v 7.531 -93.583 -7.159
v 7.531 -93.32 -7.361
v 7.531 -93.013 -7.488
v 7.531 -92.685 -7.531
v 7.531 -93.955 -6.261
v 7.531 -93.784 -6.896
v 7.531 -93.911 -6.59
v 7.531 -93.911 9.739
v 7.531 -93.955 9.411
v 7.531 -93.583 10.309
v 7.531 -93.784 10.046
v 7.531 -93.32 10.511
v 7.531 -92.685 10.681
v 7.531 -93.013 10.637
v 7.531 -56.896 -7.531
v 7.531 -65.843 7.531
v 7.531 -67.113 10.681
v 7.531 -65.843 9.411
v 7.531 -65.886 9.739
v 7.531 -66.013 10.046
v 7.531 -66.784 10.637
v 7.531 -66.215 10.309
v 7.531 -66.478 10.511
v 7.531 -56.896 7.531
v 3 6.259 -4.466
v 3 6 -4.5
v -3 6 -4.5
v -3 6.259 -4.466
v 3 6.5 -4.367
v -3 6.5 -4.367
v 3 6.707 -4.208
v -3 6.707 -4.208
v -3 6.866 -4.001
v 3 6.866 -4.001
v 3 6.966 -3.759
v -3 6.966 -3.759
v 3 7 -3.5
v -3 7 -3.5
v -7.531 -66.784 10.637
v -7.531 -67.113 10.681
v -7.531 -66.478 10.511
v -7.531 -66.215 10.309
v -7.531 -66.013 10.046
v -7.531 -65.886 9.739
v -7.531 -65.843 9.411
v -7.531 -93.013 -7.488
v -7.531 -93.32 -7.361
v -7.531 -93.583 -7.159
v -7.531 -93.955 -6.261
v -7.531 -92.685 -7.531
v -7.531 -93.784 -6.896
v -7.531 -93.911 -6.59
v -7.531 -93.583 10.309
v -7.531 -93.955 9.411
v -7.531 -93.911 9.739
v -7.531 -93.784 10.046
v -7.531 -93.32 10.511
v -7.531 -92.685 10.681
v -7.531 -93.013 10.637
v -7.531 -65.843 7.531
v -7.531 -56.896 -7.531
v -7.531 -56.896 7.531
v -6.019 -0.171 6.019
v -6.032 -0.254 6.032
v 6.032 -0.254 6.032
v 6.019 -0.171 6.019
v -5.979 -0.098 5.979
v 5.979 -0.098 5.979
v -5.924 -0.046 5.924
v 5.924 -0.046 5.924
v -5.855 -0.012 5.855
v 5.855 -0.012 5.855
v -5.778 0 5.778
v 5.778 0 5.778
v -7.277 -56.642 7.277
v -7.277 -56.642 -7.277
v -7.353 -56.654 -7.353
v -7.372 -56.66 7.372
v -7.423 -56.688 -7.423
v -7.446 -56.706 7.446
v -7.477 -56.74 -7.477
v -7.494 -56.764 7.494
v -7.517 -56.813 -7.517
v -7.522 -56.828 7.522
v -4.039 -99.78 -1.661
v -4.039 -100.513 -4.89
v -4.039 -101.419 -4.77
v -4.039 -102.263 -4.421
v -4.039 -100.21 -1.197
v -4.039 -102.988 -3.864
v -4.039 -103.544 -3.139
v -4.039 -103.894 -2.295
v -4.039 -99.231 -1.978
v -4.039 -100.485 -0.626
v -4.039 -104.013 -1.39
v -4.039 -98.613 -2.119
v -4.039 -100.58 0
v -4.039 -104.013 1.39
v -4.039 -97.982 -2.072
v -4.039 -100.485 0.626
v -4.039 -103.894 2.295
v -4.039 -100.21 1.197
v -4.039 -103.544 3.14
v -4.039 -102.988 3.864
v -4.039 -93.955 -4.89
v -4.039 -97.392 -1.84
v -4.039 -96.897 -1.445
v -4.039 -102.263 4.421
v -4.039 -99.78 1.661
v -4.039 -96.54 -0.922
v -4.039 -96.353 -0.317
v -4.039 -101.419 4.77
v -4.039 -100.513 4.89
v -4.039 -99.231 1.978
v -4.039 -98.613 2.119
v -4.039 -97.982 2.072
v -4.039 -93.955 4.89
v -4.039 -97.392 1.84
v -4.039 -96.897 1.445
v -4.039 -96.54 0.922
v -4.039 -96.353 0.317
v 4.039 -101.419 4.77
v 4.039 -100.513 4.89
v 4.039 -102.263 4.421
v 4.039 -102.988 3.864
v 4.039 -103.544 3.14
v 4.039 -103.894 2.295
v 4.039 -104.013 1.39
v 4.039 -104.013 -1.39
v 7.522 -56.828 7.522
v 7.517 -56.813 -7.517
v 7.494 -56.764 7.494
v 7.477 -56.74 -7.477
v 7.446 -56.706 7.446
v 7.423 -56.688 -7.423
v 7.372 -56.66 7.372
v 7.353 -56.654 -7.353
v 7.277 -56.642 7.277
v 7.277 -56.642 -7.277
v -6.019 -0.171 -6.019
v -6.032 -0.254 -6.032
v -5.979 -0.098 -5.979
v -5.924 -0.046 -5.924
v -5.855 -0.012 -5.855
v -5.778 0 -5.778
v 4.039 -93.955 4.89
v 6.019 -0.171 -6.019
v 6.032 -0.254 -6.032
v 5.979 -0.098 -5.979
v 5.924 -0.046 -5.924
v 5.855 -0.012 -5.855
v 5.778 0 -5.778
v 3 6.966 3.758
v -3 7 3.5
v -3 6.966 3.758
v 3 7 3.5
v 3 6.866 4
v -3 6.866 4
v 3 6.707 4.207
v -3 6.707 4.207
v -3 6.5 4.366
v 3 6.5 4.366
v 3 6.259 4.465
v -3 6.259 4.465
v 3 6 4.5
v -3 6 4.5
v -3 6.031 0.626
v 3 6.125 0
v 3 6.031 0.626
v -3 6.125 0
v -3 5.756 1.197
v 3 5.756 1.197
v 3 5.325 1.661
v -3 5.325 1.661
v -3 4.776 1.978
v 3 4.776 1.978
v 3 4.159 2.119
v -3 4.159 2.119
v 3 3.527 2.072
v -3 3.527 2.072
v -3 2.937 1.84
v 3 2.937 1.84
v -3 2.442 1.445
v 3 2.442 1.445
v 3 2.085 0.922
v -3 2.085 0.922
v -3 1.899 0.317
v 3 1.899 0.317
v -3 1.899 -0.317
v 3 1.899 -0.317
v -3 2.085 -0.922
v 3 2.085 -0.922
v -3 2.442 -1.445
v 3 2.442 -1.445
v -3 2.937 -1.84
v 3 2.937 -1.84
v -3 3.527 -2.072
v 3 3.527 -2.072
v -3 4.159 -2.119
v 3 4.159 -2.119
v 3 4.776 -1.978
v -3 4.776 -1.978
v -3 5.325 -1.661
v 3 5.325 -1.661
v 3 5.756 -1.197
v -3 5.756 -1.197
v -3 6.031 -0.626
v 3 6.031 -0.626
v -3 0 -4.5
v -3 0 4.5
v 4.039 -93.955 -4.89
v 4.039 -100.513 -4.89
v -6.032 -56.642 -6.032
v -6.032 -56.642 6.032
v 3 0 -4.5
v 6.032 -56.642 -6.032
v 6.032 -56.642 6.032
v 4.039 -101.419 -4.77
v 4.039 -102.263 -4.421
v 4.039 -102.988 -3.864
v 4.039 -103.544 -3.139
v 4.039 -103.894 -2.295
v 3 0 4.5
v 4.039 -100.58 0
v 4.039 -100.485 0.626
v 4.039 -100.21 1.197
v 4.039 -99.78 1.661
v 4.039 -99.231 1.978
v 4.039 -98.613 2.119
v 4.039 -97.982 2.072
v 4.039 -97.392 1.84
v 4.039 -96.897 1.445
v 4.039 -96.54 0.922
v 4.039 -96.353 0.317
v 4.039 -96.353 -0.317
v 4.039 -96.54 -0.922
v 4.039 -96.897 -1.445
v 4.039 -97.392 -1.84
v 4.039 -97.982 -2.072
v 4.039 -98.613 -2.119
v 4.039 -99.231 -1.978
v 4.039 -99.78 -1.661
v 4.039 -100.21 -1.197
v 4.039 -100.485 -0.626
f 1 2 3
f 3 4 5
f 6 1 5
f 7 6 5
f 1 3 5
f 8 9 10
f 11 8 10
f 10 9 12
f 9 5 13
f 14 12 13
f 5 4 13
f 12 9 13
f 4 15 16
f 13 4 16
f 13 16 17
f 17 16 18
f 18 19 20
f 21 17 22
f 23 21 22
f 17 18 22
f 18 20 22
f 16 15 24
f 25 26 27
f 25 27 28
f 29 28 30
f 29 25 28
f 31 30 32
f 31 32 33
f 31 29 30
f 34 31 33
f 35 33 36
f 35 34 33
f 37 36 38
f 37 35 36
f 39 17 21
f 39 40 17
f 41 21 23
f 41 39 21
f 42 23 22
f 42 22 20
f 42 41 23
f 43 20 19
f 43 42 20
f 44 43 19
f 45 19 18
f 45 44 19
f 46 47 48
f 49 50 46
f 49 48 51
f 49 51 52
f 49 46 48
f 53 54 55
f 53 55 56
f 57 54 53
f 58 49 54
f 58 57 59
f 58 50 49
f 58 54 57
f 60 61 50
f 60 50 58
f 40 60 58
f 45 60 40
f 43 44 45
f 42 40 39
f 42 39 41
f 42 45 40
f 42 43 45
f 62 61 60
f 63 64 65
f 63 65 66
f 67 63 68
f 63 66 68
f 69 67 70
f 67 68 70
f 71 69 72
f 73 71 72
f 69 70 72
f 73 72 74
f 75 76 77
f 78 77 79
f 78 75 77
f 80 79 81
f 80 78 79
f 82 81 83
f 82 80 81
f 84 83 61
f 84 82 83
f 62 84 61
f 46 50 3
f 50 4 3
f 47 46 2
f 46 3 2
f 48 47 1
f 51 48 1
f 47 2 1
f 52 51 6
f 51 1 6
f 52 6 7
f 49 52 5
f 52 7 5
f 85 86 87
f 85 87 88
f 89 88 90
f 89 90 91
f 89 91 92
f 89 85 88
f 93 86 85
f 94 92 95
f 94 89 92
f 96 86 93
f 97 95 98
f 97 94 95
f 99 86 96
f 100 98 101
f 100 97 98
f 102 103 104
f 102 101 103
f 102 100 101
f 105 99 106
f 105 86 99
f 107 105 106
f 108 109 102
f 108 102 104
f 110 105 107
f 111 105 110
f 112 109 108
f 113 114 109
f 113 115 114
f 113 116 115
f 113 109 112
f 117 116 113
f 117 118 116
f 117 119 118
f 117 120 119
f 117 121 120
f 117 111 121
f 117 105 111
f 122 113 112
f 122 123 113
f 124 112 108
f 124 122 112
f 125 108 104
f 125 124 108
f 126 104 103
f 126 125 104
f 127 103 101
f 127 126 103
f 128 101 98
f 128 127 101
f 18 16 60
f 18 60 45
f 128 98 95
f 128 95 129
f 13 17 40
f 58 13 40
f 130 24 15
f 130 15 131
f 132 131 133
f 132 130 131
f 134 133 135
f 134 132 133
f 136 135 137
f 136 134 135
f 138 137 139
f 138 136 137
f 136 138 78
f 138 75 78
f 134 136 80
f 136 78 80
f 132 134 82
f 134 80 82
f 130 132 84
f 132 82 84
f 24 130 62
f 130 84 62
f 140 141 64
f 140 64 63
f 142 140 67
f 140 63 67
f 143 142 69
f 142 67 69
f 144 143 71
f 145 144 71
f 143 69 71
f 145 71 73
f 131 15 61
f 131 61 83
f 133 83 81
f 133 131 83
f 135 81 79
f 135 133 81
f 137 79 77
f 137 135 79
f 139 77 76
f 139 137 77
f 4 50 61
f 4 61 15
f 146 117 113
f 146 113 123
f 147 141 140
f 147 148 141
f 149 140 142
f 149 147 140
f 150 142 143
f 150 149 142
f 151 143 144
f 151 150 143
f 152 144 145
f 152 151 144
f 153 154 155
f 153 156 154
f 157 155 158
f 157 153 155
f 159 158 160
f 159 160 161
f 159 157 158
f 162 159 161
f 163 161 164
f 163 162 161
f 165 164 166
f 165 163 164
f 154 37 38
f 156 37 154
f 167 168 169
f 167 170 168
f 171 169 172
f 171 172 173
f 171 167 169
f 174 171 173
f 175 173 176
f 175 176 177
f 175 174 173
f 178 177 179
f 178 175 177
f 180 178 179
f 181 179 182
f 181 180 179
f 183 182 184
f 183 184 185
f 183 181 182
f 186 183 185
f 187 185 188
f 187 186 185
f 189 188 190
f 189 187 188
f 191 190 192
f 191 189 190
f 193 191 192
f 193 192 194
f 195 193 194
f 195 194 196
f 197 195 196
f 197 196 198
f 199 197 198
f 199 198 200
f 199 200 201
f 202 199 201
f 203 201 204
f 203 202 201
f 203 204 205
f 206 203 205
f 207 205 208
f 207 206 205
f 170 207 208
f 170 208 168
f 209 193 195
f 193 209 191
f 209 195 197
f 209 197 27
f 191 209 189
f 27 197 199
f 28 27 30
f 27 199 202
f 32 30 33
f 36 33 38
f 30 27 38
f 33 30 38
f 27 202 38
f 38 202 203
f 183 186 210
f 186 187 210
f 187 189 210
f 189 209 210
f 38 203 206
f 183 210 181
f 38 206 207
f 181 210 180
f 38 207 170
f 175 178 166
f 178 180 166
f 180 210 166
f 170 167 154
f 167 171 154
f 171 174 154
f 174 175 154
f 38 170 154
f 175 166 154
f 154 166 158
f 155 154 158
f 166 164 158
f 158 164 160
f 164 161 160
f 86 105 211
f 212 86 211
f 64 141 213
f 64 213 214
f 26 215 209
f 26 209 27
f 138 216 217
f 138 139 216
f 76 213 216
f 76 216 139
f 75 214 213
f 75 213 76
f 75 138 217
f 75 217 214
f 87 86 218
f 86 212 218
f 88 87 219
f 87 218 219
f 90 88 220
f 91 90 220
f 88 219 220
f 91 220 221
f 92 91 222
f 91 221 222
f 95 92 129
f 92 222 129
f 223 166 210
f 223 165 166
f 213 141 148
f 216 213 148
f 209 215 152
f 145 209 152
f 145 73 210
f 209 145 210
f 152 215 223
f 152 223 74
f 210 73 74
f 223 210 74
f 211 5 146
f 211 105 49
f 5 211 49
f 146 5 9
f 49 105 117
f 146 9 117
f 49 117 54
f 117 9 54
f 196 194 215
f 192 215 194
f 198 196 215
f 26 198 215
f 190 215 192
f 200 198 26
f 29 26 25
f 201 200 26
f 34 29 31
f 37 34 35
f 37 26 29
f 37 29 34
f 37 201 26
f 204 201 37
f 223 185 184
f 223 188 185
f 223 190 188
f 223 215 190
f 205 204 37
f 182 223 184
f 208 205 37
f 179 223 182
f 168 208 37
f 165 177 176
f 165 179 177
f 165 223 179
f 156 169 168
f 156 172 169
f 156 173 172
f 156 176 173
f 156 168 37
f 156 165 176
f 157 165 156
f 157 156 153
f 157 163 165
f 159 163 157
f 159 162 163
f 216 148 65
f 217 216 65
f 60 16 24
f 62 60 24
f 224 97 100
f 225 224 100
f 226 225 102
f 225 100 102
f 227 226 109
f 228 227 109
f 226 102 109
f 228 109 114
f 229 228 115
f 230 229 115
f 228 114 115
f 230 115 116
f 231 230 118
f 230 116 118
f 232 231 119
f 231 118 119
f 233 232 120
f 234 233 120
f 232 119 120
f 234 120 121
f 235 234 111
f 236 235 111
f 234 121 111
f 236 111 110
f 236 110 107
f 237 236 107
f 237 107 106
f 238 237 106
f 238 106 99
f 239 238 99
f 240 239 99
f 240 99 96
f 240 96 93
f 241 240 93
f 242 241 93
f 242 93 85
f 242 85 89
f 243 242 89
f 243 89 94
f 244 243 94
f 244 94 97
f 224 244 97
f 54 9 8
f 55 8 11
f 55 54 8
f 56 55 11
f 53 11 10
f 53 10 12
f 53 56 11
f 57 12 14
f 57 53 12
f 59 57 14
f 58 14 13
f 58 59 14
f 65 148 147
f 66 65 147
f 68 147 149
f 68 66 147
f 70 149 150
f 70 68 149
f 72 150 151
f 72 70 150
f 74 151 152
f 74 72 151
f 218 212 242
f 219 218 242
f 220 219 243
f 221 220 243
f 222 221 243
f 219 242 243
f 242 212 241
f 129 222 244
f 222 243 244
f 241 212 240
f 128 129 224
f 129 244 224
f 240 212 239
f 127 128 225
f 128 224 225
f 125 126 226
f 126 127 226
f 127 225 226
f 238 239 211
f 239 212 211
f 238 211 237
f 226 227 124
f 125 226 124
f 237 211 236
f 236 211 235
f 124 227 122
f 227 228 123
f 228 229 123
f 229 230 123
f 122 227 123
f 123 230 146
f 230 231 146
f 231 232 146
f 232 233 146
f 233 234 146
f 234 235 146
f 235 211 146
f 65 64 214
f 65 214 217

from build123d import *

# Parameters (mm, degrees)
F0_W      = 12.065
F0_H      = 12.065
F1_DEPTH  = 56.642
F2_W      = 15.0622
F2_H      = 15.0622
F2_W_2    = 12.065
F2_H_2    = 12.065
F3_DEPTH  = 37.3126
F4_W      = 15.0622
F4_H      = 3.1496
F5_DEPTH  = 37.3126
F6_W      = 9.2009786564
F6_H      = 3.1496
F7_DEPTH  = 254
F8_R      = 0.254
F9_R      = 1.27
F10_W     = 8.0772
F10_H     = 9.779
F11_DEPTH = 10.0584
F12_R     = 2.125
F13_DEPTH = 25
F14_R     = 3.5
F16_R     = 2.125
F17_DEPTH = 3


with BuildPart() as f1:
    # F0 (on Front) → F1 (new body)
    with BuildSketch(Plane.XZ):
        Rectangle(F0_W, F0_H)
    extrude(amount=F1_DEPTH)

    # F2 (on face) → F3 (join)
    with BuildSketch(Plane.XZ.offset(56.642)):
        Rectangle(F2_W, F2_H)
        Rectangle(F2_W_2, F2_H_2, mode=Mode.SUBTRACT)
        Rectangle(F2_W_2, F2_H_2)
    extrude(amount=F3_DEPTH)

    # F4 (on face) → F5 (join, through all)
    with BuildSketch(Plane(origin=(0, -56.642, 0), x_dir=(-1, 0, 0), z_dir=(0, 1, 0))):
        with Locations((0, 9.1059)):
            Rectangle(F4_W, F4_H)
    extrude(amount=-F5_DEPTH)

    # F6 (on face) → F7 (cut)
    with BuildSketch(Plane.YZ.offset(7.5311)):
        with Locations((-61.2424893282, 9.1059)):
            Rectangle(F6_W, F6_H)
    extrude(amount=-F7_DEPTH, mode=Mode.SUBTRACT)

    # F8
    f8_edges = [f1.edges().sort_by_distance(p)[0] for p in [
        (0, -56.642, 7.5311),
        (7.5311, -56.642, 0),
        (0, -56.642, -7.5311),
        (-7.5311, -56.642, 0),
        (-6.0325, 0, 0),
        (0, 0, 6.0325),
        (6.0325, 0, 0),
        (0, 0, -6.0325),
    ]]
    fillet(f8_edges, radius=F8_R)

    # F9
    f9_edges = [f1.edges().sort_by_distance(p)[0] for p in [
        (0, -65.842979, 10.6807),
        (0, -93.9546, 10.6807),
        (0, -93.9546, -7.5311),
    ]]
    fillet(f9_edges, radius=F9_R)

    # F10 (on face) → F11 (join)
    with BuildSketch(Plane.XZ.offset(93.9546)):
        Rectangle(F10_W, F10_H)
    extrude(amount=F11_DEPTH)

    # F12 (on face) → F13 (cut)
    with BuildSketch(Plane(origin=(-4.0386, 0, 0), x_dir=(0, -1, 0), z_dir=(-1, 0, 0))):
        with Locations((98.4546, 0)):
            Circle(F12_R)
    extrude(amount=-F13_DEPTH, mode=Mode.SUBTRACT)

    # F14
    f14_edges = [f1.edges().sort_by_distance(p)[0] for p in [
        (0, -104.013, 4.8895),
        (0, -104.013, -4.8895),
    ]]
    fillet(f14_edges, radius=F14_R)

    # F16 (on Right) → F17 (join, symmetric)
    with BuildSketch(Plane.YZ):
        with BuildLine():
            Line((0, 4.4995), (0, -4.5005))
            Line((0, -4.5005), (6, -4.5005))
            ThreePointArc((6, -4.5005), (6.7071067812, -4.2076067812), (7, -3.5005))
            Line((7, -3.5005), (7, 3.4995))
            ThreePointArc((7, 3.4995), (6.7071067812, 4.2066067812), (6, 4.4995))
            Line((6, 4.4995), (0, 4.4995))
        make_face()
        with Locations((4, 0)):
            Circle(F16_R, mode=Mode.SUBTRACT)
    extrude(amount=F17_DEPTH, both=True)


solid = f1.part
